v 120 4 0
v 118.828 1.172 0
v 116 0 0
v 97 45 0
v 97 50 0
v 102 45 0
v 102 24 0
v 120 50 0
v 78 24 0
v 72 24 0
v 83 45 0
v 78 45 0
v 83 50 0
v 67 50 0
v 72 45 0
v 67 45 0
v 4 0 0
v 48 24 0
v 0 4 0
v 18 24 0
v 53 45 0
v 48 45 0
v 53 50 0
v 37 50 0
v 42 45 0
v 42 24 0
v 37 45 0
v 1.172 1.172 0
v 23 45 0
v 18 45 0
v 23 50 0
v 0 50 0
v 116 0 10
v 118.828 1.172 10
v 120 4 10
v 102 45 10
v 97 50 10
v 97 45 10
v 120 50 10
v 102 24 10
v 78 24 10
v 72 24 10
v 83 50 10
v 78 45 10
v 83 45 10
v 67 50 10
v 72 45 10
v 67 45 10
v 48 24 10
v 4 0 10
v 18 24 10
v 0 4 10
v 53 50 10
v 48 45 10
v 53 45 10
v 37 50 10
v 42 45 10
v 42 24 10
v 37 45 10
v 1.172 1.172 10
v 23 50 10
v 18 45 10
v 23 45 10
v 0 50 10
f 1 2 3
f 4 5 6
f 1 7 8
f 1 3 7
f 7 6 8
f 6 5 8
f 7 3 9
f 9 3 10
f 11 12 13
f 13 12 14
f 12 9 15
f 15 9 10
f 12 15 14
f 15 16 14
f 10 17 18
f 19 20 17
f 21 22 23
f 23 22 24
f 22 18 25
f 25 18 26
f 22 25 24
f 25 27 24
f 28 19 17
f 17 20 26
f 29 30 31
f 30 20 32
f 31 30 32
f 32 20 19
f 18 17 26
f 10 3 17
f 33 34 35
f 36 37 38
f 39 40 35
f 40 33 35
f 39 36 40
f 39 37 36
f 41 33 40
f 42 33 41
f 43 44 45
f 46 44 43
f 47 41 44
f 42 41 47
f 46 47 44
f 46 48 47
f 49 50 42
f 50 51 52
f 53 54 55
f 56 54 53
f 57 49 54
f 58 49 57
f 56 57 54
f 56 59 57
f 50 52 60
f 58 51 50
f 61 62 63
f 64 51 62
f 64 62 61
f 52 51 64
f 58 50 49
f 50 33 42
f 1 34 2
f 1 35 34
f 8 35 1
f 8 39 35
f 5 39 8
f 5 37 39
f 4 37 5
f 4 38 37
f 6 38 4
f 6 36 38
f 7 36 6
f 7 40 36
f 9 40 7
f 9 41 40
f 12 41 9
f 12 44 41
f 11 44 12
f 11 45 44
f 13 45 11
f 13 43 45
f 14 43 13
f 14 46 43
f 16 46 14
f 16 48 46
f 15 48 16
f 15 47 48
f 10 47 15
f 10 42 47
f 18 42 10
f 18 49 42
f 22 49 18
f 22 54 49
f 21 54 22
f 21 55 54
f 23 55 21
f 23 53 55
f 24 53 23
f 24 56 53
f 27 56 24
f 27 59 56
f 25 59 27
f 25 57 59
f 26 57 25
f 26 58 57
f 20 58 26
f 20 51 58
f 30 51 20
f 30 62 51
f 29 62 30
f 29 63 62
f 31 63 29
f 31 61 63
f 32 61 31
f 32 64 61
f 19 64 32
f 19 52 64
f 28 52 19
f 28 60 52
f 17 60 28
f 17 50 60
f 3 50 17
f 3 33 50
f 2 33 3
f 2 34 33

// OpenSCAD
$fn = 32;

// ----------------------------------------------------------------------
// Oversize slot bar: 120 mm bar with 3 oversize windows
// ----------------------------------------------------------------------

// --- parameters (mm) ---
profile_height = 10;      // extrusion height
profile_points = 32;      // points of the closed outline

profile = [[0, 4], [1.172, 1.172], [4, 0], [116, 0], [118.828, 1.172], [120, 4], [120, 50], [97, 50], [97, 45], [102, 45], [102, 24], [78, 24], [78, 45], [83, 45], [83, 50], [67, 50], [67, 45], [72, 45], [72, 24], [48, 24], [48, 45], [53, 45], [53, 50], [37, 50], [37, 45], [42, 45], [42, 24], [18, 24], [18, 45], [23, 45], [23, 50], [0, 50]];  // single closed polygon, 32 points, counter clockwise

// --- the one profile operation ---
linear_extrude(height = profile_height) polygon(points = profile);
